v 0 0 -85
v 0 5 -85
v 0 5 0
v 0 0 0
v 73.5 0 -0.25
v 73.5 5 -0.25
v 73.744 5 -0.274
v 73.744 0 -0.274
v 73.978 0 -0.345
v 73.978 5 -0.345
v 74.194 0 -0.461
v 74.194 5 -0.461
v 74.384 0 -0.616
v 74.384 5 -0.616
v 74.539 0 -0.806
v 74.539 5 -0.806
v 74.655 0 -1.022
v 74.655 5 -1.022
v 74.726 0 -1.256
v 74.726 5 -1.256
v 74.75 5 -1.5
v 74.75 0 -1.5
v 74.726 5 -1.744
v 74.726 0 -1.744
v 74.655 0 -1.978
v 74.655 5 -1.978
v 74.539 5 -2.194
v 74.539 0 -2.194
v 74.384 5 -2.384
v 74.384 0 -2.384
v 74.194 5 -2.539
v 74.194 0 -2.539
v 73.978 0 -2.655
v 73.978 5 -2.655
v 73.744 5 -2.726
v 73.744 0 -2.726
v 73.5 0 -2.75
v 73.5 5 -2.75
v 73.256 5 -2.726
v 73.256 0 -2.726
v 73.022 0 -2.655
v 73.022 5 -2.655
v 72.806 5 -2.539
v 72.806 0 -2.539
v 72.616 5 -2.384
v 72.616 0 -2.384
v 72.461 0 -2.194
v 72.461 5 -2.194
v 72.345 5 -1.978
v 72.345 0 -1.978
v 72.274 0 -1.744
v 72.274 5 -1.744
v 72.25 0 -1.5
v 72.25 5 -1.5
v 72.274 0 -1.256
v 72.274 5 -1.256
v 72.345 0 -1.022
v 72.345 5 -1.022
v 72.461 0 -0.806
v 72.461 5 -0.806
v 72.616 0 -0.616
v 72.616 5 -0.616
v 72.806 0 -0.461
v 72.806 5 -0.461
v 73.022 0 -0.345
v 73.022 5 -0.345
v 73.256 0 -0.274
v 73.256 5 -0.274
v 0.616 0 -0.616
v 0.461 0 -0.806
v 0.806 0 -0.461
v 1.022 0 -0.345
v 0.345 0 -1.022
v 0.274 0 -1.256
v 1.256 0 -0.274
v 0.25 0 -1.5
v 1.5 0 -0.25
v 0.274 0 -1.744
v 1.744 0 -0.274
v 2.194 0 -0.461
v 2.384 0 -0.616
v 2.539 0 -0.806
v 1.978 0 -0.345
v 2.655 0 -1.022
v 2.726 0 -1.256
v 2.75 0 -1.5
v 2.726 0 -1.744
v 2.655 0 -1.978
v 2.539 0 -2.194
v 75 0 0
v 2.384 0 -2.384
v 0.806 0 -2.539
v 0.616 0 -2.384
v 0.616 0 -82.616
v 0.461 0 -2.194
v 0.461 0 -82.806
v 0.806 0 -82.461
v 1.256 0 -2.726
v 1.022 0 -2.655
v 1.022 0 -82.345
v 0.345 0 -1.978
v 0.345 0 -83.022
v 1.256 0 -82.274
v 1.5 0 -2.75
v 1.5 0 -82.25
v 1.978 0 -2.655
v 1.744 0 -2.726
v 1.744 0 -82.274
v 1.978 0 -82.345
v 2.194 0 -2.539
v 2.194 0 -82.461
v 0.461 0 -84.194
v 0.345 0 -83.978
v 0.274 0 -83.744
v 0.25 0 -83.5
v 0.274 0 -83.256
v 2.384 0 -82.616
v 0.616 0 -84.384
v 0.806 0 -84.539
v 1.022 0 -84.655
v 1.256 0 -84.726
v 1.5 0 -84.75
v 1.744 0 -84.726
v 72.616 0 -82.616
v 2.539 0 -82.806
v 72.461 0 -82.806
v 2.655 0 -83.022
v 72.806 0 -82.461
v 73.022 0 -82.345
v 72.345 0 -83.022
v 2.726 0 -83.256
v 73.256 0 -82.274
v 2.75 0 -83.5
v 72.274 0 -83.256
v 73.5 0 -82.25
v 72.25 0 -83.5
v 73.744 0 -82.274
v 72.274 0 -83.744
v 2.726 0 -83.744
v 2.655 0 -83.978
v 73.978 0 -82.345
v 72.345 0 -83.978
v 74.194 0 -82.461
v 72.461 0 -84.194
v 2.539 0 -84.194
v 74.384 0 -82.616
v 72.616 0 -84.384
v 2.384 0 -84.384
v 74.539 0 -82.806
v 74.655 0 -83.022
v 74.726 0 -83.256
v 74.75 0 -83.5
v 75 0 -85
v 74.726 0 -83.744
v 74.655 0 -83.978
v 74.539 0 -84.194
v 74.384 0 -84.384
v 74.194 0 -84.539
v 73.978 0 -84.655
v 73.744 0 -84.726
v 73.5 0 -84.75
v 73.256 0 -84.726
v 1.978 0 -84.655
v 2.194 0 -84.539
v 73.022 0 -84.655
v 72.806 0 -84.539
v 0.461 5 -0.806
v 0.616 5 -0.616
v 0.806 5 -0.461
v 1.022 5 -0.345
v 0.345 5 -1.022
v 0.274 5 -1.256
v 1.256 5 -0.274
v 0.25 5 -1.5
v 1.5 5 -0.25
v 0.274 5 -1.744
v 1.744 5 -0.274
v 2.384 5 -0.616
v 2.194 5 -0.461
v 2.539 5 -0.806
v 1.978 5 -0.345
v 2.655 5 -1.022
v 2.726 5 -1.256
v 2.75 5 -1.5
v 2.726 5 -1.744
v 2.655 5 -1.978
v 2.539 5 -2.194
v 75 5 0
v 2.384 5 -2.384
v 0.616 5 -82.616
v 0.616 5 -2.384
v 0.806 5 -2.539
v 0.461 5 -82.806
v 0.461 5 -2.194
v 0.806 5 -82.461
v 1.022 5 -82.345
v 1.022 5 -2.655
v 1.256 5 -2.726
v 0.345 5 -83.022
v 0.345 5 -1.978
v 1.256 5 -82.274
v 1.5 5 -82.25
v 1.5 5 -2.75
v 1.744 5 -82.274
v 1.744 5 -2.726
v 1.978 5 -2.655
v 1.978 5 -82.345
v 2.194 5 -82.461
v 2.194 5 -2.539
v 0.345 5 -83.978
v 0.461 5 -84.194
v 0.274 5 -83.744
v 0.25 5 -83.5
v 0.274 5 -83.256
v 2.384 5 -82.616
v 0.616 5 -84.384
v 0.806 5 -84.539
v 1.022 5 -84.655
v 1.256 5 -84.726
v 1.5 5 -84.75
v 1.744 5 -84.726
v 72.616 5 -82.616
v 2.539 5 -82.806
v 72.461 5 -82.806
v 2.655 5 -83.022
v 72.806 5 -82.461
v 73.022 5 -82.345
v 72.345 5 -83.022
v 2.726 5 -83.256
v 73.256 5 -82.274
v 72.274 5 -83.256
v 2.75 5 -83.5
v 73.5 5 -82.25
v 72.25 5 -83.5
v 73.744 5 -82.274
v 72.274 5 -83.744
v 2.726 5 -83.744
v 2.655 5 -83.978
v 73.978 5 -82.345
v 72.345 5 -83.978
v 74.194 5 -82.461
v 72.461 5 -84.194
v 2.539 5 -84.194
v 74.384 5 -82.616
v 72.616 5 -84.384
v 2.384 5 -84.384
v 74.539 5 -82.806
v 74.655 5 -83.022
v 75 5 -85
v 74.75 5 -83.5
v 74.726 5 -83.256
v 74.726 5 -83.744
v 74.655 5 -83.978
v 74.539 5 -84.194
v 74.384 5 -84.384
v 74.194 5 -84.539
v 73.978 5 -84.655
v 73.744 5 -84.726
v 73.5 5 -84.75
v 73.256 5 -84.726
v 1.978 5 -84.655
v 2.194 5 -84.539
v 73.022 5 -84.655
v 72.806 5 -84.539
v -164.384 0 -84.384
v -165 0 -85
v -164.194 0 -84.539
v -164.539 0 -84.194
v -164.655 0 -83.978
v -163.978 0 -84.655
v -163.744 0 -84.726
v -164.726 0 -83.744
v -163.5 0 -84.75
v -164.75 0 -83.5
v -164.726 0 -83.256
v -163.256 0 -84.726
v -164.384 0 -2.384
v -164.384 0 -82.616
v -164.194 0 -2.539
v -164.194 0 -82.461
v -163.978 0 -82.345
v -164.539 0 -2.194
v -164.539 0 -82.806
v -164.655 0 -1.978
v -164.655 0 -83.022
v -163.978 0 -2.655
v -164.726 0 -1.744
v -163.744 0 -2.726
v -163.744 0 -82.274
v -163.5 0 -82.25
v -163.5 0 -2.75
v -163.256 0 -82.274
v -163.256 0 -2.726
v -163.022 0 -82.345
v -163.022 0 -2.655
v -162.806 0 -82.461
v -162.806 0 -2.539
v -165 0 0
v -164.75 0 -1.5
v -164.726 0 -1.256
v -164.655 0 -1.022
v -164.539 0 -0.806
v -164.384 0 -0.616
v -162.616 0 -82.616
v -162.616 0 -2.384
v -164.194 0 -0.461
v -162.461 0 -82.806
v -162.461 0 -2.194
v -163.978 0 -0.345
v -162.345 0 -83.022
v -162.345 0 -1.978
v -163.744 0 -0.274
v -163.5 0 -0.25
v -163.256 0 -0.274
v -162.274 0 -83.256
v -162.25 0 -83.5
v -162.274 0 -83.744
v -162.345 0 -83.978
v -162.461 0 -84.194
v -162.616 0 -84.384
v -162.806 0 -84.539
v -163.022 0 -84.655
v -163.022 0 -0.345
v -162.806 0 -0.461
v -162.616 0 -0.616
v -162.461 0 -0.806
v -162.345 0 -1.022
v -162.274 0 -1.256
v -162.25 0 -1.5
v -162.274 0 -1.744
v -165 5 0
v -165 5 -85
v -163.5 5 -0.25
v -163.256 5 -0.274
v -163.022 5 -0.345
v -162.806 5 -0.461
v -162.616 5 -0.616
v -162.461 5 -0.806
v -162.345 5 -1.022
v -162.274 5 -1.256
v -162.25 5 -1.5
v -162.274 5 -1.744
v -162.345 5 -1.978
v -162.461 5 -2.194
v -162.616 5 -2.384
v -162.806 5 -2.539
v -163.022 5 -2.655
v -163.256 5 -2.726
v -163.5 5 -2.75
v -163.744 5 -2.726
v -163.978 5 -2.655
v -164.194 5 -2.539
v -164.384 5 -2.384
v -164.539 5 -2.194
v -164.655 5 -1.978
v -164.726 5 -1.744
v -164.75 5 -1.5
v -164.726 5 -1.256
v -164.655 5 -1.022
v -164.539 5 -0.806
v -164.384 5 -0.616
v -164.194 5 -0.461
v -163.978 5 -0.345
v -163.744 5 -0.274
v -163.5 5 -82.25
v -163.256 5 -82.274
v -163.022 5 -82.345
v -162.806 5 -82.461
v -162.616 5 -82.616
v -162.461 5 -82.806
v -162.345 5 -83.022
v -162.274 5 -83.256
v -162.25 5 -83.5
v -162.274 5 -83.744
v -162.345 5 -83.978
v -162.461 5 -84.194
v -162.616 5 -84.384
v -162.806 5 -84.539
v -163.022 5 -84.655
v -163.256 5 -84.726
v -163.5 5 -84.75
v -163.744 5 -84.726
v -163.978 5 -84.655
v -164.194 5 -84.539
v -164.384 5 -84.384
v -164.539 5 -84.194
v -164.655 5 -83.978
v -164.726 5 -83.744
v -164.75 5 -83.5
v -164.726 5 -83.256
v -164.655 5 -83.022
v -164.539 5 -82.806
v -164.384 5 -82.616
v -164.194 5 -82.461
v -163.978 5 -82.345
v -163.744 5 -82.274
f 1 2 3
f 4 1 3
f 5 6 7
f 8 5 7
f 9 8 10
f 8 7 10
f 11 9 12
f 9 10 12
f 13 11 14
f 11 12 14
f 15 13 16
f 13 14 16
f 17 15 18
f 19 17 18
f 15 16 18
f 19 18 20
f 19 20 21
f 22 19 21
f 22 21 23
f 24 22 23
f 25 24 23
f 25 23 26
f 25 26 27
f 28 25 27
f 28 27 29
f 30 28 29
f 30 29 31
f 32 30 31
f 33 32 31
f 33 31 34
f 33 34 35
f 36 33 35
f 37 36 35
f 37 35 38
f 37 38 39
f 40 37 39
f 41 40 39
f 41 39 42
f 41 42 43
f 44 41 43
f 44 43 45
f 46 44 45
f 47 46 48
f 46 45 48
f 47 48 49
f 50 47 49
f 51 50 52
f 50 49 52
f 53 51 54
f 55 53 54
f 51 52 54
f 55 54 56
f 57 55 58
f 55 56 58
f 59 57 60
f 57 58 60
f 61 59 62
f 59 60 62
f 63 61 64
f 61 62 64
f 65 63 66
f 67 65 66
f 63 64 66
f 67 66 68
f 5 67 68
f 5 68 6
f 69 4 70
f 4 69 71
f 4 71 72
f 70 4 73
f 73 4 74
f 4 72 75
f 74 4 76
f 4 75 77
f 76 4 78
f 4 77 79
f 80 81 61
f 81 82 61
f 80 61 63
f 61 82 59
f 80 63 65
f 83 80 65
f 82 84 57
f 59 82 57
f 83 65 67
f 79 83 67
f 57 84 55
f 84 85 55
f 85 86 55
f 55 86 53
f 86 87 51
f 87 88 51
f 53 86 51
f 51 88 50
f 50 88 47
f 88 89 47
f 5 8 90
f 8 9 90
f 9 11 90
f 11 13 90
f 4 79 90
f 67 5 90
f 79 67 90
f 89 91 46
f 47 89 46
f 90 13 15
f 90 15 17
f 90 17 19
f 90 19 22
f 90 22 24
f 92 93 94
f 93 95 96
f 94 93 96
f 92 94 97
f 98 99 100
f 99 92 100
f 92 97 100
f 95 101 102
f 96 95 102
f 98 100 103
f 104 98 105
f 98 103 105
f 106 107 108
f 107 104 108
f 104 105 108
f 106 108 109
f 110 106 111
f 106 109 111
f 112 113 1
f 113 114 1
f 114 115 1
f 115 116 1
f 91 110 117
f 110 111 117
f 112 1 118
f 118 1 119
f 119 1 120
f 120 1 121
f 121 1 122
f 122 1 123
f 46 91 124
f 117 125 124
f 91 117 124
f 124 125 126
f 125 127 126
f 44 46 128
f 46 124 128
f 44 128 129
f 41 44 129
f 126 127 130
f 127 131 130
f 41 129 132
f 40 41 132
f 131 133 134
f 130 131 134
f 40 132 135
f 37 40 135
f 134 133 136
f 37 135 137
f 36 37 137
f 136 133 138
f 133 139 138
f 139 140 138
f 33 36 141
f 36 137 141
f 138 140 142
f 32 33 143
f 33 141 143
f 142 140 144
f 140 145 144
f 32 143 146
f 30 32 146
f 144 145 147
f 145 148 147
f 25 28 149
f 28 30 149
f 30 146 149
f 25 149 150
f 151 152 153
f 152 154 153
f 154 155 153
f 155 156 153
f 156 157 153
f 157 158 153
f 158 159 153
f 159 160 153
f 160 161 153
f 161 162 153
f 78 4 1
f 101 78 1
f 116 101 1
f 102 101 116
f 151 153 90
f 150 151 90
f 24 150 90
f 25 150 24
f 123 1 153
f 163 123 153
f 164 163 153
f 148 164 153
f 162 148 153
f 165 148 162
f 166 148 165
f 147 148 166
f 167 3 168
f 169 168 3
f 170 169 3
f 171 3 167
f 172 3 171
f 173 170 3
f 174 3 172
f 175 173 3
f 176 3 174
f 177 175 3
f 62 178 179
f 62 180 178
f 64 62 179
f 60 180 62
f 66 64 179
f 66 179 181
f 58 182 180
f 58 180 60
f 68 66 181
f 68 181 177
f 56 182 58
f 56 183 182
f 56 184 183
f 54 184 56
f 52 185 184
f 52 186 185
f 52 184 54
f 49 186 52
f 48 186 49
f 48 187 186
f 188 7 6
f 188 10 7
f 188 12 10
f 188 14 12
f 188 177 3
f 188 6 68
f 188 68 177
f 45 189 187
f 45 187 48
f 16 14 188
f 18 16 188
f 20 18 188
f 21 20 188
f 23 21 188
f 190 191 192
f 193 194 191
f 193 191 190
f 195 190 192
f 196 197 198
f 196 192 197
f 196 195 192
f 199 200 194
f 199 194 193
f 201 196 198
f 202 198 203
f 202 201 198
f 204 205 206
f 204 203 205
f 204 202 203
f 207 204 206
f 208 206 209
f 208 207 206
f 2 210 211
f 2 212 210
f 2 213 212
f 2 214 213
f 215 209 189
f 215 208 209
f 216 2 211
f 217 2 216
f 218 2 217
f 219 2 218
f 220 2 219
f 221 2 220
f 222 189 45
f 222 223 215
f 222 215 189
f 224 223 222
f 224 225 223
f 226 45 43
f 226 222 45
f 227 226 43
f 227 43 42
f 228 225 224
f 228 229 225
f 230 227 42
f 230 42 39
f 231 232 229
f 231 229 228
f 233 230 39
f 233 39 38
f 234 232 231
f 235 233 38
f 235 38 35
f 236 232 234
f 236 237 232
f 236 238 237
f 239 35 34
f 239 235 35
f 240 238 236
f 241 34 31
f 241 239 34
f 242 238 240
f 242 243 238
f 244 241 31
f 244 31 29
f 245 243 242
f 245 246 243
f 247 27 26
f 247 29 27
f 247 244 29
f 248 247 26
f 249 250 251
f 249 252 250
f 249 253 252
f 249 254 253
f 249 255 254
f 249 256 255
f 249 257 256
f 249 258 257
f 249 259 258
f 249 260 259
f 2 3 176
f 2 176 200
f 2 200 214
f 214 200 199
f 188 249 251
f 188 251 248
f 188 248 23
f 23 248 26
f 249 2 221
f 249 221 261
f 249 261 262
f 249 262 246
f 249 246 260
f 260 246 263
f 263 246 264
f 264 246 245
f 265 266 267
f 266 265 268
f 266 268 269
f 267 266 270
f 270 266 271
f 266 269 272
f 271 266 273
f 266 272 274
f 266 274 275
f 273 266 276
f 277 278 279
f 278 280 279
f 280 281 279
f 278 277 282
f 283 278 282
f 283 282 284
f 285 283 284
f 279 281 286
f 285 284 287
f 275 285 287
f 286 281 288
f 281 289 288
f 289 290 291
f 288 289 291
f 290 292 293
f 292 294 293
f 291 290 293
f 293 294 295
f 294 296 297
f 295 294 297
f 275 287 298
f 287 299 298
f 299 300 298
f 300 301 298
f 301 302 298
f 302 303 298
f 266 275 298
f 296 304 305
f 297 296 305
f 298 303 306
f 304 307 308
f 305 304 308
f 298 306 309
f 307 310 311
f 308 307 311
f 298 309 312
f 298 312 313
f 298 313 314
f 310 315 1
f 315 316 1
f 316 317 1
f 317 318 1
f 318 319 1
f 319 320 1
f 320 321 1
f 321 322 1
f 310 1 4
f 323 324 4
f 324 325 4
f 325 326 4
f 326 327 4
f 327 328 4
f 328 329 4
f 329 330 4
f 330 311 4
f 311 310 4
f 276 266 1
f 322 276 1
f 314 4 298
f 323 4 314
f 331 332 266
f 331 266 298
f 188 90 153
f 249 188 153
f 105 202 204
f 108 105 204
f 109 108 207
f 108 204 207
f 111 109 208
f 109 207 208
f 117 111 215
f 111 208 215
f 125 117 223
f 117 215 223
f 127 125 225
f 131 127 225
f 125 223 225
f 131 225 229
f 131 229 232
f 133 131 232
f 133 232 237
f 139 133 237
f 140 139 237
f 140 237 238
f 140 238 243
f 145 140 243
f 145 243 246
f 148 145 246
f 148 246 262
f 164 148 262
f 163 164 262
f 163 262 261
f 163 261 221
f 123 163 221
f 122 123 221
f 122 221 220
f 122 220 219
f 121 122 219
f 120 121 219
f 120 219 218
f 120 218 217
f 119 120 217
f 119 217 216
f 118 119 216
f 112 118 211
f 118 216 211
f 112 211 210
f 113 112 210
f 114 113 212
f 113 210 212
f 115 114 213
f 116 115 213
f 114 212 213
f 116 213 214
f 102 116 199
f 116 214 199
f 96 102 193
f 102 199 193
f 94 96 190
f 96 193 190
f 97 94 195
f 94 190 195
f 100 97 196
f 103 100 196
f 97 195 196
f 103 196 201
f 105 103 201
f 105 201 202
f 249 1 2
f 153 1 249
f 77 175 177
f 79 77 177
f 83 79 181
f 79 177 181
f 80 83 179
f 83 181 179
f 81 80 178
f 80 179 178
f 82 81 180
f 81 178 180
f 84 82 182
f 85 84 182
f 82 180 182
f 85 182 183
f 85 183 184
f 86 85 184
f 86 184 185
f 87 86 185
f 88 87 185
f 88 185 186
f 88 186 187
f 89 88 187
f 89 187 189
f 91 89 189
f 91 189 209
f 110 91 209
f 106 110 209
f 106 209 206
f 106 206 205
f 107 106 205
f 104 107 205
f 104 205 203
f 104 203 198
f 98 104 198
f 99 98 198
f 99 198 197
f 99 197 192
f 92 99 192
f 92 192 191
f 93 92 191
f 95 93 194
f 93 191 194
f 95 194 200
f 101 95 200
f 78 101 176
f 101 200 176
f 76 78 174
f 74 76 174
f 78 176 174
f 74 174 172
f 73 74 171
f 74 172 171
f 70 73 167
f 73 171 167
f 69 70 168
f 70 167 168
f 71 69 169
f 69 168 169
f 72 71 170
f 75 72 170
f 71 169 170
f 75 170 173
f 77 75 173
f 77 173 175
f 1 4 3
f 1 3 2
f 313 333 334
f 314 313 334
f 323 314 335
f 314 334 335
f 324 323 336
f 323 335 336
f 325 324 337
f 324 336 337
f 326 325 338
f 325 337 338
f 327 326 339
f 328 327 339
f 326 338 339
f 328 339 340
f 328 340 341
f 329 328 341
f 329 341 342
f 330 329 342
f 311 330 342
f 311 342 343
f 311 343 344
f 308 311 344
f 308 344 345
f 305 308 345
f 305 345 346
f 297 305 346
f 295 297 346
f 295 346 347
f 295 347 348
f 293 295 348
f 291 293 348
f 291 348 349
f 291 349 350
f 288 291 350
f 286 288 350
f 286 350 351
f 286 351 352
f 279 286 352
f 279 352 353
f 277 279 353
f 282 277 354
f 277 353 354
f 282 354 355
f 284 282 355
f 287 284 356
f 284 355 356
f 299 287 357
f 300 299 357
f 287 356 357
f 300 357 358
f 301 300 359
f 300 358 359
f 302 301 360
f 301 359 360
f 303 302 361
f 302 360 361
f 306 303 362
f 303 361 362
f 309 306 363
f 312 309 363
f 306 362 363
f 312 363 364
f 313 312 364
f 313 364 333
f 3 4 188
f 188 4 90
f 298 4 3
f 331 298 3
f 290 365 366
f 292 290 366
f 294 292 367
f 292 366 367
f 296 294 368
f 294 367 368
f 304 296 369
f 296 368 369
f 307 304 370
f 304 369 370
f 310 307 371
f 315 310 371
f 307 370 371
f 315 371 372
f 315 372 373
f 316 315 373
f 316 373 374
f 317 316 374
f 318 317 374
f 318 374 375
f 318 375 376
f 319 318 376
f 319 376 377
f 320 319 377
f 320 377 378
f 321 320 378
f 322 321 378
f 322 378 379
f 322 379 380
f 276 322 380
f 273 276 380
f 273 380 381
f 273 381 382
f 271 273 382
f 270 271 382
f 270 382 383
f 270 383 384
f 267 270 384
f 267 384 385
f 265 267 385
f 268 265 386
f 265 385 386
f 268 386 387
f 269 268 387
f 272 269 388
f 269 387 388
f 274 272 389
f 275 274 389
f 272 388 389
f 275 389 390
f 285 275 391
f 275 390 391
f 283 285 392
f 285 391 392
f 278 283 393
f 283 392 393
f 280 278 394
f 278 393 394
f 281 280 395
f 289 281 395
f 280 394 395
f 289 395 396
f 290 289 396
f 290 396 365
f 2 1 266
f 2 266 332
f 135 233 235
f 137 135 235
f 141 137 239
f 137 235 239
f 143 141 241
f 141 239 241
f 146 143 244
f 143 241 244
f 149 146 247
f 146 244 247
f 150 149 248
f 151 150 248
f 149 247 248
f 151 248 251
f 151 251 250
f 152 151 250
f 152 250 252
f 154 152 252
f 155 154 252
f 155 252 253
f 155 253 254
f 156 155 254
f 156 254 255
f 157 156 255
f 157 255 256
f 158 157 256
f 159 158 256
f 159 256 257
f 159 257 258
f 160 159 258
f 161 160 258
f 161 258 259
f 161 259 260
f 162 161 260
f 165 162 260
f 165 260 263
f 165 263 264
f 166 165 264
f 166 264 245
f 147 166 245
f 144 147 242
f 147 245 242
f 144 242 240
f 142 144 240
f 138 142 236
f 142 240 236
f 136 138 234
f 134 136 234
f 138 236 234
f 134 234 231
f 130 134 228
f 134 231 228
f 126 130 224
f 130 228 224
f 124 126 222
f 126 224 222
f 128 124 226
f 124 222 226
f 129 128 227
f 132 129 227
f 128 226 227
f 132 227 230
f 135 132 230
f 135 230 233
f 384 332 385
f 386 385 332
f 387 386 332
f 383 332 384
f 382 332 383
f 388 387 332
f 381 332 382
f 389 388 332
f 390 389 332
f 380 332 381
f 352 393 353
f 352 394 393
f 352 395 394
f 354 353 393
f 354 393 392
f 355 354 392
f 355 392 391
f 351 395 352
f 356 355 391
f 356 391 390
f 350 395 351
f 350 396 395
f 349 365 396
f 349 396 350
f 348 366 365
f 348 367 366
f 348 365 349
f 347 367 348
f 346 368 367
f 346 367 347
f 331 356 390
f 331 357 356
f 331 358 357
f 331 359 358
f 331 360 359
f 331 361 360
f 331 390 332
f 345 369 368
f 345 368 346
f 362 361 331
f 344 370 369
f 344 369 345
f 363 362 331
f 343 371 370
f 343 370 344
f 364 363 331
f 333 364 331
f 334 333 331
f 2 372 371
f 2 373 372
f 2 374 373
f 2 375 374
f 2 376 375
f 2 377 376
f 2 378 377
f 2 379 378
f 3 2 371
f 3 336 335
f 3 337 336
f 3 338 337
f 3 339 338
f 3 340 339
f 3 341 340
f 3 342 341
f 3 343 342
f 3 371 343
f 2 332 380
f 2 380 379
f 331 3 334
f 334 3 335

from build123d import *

# Parameters (mm, degrees)
IZIM1_W                     = 75
IZIM1_H                     = 85
Y_KSEKLIK_EKSTR_ZYON1_DEPTH = 5
IZIM2_W                     = 85
IZIM2_H                     = 5
Y_KSEKLIK_EKSTR_ZYON3_DEPTH = 165
IZIM3_R                     = 1.25
KES_EKSTR_ZYON1_DEPTH       = 186.674446276
IZIM4_R                     = 1.25
KES_EKSTR_ZYON2_DEPTH       = 186.674446276


with BuildPart() as part:
    # Çizim1 → Yükseklik-Ekstrüzyon1 (new body)
    with BuildSketch(Plane(origin=(0, 0, 0), x_dir=(1, 0, 0), z_dir=(0, 1, 0))):
        with Locations((37.5, 42.5)):
            Rectangle(IZIM1_W, IZIM1_H)
    extrude(amount=Y_KSEKLIK_EKSTR_ZYON1_DEPTH)

    # Çizim3 → Kes-Ekstrüzyon1 (cut, through all)
    with BuildSketch(Plane(origin=(0, 5, 0), x_dir=(1, 0, 0), z_dir=(0, 1, 0))):
        with Locations(Location((1.5, 1.5, 0), (0, 0, 270))):
            Circle(IZIM3_R)
        with Locations(Location((73.5, 1.5, 0), (0, 0, 270))):
            Circle(IZIM3_R)
        with Locations(Location((73.5, 83.5, 0), (0, 0, 270))):
            Circle(IZIM3_R)
        with Locations(Location((1.5, 83.5, 0), (0, 0, 270))):
            Circle(IZIM3_R)
    extrude(amount=-KES_EKSTR_ZYON1_DEPTH, mode=Mode.SUBTRACT)


with BuildPart() as body_2:
    # Çizim2 → Yükseklik-Ekstrüzyon3 (new body)
    with BuildSketch(Plane.ZY):
        with Locations((-42.5, 2.5)):
            Rectangle(IZIM2_W, IZIM2_H)
    extrude(amount=Y_KSEKLIK_EKSTR_ZYON3_DEPTH)

    # Çizim4 → Kes-Ekstrüzyon2 (cut, through all)
    with BuildSketch(Plane(origin=(0, 5, 0), x_dir=(1, 0, 0), z_dir=(0, 1, 0))):
        with Locations(Location((-163.5, 1.5, 0), (0, 0, 270))):
            Circle(IZIM4_R)
        with Locations(Location((-163.5, 83.5, 0), (0, 0, 270))):
            Circle(IZIM4_R)
    extrude(amount=-KES_EKSTR_ZYON2_DEPTH, mode=Mode.SUBTRACT)


solid = Compound([part.part, body_2.part])
